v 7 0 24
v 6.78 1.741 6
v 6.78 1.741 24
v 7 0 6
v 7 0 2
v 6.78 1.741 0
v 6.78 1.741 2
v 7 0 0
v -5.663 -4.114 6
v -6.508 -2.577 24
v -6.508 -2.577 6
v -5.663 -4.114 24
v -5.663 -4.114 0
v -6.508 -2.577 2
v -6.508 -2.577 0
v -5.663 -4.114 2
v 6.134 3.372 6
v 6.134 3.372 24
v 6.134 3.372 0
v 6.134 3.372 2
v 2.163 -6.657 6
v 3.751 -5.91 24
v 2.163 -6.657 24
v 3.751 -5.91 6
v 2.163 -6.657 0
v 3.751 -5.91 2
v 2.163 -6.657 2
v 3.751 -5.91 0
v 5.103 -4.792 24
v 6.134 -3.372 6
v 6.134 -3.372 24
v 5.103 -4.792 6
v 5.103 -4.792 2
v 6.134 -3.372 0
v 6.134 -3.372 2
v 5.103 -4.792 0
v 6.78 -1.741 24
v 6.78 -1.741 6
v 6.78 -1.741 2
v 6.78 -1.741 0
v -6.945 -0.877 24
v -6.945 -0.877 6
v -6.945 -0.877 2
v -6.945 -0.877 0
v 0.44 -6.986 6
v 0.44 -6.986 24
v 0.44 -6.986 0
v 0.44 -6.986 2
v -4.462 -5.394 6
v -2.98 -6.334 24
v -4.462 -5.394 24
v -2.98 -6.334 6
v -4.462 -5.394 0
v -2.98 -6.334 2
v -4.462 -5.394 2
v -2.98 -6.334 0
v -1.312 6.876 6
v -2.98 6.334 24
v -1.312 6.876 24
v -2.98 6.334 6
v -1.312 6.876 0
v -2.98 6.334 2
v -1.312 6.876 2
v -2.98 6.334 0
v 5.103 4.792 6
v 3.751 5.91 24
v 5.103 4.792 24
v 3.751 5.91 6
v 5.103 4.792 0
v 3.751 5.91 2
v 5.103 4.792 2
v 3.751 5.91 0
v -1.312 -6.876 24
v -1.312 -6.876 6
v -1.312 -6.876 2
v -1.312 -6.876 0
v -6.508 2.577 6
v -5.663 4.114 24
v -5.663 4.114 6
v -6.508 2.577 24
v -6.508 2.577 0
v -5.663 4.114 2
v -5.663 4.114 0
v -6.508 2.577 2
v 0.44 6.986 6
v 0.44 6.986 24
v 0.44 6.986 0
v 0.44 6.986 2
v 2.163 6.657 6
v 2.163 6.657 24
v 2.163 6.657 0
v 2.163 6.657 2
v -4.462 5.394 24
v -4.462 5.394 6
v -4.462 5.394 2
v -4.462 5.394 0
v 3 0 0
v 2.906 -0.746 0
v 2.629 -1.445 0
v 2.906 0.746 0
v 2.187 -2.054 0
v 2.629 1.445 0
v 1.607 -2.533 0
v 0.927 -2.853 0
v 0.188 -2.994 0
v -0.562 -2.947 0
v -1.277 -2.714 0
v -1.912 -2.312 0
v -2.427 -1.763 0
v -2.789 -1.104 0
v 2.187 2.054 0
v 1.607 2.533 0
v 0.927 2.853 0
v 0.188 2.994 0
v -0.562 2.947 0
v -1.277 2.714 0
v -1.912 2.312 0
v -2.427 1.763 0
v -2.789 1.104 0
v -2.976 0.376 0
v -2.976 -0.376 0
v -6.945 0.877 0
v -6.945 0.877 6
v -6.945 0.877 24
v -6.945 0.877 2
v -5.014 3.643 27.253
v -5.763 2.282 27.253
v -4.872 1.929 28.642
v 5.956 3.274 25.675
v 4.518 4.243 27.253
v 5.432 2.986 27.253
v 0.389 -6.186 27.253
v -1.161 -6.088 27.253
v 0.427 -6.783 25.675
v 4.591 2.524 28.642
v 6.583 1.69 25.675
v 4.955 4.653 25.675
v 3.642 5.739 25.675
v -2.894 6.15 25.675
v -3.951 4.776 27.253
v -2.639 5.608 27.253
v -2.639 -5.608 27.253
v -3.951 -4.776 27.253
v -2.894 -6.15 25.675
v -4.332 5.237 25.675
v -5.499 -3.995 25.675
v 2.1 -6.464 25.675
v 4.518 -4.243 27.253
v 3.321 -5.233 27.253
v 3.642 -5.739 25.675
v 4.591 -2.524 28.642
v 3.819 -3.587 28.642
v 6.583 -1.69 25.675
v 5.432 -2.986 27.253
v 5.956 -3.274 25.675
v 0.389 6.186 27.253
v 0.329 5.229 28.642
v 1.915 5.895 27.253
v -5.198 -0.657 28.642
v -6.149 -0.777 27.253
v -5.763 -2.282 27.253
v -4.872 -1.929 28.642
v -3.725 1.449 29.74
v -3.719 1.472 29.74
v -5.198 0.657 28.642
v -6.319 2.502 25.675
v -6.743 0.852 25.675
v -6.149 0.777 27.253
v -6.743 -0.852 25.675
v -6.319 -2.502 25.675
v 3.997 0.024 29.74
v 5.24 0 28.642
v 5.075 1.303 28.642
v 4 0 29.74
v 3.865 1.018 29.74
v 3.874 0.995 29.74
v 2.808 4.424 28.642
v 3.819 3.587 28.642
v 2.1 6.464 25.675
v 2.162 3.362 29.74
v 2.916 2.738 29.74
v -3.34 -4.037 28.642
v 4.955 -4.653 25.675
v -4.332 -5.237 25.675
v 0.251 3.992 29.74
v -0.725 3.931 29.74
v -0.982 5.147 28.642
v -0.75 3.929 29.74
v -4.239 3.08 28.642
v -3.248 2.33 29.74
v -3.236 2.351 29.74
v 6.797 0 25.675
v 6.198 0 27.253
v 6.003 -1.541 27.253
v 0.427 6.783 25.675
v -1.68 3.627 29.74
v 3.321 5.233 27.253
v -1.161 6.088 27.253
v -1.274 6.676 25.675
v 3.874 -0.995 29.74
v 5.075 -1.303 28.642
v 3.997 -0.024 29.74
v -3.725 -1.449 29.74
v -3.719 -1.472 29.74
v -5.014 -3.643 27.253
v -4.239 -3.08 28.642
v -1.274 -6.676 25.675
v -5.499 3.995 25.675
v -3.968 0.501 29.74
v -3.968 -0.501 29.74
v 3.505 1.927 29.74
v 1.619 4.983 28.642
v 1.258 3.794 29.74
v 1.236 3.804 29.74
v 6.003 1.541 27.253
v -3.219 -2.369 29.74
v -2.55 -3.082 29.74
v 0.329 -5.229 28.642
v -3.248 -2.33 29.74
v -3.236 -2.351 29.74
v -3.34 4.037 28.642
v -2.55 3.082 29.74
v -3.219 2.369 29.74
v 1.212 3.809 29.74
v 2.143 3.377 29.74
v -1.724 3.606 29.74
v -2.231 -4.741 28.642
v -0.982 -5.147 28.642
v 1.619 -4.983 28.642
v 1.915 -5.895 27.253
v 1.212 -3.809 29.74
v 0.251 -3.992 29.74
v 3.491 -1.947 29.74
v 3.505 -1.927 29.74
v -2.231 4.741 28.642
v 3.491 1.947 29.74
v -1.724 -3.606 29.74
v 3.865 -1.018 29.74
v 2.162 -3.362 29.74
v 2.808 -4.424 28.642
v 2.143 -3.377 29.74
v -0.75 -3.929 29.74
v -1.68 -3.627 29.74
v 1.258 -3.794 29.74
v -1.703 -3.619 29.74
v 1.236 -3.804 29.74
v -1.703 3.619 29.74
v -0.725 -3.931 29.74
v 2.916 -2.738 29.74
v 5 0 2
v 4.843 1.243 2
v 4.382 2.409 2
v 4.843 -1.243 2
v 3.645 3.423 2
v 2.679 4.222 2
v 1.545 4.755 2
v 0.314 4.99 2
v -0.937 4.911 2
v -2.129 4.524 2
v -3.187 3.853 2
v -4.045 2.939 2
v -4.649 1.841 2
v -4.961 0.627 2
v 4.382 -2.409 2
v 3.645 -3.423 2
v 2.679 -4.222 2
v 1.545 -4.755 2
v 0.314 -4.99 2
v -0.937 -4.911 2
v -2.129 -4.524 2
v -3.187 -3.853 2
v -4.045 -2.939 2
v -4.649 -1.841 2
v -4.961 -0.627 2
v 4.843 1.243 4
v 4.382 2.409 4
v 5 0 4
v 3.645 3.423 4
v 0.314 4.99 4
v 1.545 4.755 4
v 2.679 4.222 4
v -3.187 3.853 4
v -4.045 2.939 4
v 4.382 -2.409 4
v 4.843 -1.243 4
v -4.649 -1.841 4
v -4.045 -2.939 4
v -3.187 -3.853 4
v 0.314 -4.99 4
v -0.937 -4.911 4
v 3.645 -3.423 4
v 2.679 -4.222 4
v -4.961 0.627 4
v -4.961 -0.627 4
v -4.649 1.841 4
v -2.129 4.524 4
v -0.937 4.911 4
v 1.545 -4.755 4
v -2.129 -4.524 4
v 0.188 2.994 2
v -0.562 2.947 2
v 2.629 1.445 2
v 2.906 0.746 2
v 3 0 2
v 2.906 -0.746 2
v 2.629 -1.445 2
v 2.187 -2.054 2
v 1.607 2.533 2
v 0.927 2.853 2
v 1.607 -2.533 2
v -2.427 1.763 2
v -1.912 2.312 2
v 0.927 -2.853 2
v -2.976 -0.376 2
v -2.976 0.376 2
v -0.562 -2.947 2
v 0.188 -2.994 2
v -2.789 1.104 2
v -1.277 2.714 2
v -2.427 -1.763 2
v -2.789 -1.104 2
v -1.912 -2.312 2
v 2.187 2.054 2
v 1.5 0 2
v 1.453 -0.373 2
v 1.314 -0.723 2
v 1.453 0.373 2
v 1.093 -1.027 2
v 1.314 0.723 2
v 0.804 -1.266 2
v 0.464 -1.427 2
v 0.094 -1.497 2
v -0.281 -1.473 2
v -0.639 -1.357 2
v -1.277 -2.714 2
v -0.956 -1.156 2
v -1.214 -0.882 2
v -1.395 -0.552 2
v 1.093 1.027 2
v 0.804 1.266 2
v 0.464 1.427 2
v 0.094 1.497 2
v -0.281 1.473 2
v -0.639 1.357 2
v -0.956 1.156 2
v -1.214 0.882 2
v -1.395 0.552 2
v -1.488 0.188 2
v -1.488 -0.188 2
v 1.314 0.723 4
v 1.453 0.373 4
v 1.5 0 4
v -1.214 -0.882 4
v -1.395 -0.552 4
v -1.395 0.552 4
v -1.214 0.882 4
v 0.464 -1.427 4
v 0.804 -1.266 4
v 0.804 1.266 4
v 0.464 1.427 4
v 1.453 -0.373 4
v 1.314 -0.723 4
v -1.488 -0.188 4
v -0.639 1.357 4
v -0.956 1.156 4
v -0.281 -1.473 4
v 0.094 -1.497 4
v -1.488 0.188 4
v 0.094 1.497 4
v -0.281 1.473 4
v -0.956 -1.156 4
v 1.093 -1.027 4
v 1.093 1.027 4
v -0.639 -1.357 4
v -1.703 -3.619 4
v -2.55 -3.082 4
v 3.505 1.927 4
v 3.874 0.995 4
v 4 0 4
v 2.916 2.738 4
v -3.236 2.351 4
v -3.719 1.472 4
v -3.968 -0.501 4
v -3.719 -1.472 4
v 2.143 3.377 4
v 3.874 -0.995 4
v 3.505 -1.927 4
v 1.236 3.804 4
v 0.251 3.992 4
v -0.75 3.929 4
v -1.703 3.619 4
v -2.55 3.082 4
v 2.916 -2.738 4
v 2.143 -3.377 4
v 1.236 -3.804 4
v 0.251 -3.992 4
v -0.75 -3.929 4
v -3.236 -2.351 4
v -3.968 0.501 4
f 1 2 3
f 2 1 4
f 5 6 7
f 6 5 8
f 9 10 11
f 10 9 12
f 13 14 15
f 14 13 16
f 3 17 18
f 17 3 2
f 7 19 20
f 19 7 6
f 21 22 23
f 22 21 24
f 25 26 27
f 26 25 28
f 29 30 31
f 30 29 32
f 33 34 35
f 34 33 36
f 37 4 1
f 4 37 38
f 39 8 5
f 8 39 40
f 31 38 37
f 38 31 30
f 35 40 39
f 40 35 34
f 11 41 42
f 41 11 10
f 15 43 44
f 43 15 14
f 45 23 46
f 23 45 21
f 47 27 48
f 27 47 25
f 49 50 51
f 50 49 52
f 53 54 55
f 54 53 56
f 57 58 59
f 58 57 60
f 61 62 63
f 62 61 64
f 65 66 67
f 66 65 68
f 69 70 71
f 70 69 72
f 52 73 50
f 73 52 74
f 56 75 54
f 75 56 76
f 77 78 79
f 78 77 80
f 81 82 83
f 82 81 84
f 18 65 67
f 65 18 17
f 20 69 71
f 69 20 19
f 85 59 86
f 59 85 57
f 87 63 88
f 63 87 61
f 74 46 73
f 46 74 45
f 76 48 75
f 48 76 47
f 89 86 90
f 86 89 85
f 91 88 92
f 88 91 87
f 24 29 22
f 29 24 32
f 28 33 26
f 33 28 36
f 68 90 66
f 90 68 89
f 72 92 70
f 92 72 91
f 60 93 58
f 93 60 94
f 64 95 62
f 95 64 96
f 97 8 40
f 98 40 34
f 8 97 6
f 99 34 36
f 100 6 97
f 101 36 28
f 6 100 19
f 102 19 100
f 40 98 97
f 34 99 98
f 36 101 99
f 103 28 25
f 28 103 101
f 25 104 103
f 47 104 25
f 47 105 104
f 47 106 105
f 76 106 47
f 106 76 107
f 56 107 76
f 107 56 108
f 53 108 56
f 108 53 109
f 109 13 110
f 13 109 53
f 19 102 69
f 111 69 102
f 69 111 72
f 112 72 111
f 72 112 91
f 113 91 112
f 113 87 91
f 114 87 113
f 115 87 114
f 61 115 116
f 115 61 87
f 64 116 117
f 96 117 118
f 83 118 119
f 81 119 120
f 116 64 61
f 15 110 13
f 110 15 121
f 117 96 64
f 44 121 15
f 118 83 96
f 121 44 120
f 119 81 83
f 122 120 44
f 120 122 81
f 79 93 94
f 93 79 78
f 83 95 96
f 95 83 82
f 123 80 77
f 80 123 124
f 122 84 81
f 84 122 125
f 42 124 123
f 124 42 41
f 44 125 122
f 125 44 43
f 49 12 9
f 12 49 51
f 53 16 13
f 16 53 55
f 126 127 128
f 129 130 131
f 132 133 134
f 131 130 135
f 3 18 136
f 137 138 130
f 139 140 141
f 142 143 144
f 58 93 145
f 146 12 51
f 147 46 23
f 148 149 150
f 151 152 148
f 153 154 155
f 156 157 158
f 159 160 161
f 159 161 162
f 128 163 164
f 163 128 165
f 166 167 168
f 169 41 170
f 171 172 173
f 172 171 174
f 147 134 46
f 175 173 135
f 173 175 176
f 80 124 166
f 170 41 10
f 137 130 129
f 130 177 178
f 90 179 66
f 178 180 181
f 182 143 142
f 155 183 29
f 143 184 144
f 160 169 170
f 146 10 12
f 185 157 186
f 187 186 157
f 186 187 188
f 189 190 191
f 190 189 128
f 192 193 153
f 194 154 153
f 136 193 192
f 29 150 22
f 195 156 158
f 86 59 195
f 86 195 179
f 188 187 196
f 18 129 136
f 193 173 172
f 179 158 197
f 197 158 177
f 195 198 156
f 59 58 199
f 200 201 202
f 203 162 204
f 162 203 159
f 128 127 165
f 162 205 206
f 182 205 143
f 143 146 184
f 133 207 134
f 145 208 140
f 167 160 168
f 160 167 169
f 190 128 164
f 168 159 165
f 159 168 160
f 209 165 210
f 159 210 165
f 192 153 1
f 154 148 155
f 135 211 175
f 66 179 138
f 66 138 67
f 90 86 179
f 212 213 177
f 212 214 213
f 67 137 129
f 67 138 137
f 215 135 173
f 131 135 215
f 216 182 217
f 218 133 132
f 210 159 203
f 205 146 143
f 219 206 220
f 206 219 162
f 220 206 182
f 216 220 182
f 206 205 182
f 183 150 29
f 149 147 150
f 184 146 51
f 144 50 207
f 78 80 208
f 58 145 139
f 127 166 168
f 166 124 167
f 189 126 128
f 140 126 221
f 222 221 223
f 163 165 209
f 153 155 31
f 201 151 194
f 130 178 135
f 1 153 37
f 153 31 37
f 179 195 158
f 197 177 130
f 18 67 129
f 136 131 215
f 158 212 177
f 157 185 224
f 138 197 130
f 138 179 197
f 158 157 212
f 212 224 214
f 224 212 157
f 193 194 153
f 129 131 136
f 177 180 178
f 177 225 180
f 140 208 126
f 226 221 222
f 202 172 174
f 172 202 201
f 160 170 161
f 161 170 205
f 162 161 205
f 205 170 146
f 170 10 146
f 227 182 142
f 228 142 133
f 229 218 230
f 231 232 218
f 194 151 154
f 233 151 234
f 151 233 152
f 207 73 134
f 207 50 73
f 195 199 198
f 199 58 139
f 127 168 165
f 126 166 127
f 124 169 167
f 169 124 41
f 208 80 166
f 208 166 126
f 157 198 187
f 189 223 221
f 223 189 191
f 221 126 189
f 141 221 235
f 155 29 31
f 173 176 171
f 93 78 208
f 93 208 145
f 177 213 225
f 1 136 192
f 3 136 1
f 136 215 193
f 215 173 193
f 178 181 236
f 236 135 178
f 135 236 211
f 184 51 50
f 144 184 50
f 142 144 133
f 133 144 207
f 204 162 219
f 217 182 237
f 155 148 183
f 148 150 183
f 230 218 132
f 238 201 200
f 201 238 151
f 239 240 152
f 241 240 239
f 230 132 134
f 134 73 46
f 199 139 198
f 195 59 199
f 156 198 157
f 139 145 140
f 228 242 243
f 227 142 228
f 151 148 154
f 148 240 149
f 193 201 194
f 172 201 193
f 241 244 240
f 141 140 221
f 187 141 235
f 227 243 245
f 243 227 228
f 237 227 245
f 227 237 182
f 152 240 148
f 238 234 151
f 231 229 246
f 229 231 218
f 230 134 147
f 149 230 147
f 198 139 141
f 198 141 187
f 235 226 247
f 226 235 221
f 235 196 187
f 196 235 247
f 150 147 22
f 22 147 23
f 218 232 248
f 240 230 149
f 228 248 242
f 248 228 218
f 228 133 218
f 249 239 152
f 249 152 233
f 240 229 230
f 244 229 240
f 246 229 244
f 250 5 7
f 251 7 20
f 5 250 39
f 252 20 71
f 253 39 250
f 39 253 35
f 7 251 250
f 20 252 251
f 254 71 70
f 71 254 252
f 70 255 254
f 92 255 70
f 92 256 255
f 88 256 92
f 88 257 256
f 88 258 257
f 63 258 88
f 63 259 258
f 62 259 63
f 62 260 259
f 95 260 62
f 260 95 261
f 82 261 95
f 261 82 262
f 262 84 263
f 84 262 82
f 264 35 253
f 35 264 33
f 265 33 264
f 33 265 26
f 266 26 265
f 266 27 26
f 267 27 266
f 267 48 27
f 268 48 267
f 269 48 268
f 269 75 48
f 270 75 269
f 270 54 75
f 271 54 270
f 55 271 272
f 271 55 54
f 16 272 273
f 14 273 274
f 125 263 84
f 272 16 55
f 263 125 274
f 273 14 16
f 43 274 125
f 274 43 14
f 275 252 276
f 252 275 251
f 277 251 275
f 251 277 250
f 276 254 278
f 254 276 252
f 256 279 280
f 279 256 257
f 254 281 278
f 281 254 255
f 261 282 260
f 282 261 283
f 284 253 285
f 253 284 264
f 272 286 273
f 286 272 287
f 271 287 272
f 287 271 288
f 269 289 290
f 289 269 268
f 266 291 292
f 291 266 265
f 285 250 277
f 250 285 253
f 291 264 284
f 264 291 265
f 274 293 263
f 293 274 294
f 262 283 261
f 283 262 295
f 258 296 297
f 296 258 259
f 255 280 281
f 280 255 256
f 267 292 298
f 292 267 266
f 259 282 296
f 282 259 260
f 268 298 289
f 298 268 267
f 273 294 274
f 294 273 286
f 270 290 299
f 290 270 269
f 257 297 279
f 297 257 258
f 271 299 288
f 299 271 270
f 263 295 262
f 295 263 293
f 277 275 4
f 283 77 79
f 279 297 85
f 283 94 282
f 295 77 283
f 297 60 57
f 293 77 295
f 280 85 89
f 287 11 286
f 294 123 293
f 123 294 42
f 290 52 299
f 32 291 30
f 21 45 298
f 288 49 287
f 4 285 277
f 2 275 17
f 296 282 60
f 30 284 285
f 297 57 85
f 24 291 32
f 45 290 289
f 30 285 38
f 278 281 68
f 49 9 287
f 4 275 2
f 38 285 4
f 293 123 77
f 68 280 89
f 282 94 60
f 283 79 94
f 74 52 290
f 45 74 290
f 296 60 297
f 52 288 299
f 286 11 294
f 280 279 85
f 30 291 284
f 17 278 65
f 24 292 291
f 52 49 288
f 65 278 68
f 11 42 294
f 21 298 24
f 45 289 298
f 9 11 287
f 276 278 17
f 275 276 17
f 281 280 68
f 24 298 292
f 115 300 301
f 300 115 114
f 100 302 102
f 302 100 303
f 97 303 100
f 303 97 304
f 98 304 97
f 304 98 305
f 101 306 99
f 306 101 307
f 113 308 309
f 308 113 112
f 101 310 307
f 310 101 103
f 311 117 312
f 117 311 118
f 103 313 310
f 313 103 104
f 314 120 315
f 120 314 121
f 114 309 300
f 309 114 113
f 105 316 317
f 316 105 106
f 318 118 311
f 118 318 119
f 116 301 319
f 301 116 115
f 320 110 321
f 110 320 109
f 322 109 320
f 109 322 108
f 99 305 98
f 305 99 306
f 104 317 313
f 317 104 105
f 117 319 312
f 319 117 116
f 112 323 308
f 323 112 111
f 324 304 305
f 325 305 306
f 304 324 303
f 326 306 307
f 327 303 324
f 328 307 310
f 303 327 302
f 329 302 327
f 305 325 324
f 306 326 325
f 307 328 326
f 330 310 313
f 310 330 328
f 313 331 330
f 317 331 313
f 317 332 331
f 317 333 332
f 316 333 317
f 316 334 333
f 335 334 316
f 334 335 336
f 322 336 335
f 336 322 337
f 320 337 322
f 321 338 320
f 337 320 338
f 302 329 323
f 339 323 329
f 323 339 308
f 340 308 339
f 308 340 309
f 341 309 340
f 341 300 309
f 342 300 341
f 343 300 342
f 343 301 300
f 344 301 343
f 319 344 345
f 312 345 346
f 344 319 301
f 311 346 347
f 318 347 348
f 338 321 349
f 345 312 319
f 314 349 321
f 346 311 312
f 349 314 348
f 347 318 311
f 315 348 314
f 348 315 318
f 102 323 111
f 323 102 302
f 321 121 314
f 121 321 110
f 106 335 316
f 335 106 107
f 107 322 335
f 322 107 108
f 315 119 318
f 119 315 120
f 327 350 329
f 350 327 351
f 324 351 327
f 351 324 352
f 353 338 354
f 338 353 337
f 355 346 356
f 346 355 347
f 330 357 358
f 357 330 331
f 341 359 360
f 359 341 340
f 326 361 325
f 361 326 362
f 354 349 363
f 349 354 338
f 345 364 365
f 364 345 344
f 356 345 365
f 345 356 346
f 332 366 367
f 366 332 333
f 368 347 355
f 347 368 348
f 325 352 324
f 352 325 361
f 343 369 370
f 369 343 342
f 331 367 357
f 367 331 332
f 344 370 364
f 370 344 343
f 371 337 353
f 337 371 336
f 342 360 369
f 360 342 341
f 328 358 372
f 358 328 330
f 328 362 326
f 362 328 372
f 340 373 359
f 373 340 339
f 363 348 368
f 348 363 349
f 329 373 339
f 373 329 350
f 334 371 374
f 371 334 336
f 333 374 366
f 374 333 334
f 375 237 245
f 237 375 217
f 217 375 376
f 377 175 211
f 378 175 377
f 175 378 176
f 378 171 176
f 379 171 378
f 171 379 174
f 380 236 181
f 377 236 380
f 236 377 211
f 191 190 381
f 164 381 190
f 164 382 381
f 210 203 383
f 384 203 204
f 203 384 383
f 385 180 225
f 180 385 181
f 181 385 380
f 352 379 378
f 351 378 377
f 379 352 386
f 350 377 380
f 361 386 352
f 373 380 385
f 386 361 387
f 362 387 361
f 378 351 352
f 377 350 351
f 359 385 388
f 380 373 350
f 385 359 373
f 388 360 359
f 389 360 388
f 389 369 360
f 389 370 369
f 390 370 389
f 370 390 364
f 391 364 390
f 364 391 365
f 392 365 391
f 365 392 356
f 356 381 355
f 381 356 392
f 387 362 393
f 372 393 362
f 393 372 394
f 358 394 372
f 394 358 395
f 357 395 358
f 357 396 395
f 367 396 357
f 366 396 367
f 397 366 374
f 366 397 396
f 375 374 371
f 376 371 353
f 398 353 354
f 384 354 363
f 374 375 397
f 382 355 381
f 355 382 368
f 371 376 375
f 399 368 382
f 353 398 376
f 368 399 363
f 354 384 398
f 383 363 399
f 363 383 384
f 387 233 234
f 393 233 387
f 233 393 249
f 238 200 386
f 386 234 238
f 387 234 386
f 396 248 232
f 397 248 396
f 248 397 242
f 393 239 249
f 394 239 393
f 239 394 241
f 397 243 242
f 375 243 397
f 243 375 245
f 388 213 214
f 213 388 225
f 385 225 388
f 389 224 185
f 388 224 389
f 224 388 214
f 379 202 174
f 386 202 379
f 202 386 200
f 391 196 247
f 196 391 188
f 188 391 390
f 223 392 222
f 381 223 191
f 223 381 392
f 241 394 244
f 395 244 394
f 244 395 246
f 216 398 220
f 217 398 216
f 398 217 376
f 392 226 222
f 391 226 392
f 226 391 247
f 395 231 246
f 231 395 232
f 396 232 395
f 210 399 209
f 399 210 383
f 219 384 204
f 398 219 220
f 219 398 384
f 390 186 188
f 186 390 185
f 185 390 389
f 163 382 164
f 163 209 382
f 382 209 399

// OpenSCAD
$fn=25;   // For persion of polygons

height = 24;
radius = 7;
gap = 2;

cap = 3;
fuse= 1.5;
pipe= 4;

difference(){
union(){
difference(){
union(){   // this is my base shape
cylinder(r=radius,h=height);
translate([0,0,height]){
sphere(radius);}
}

translate([0,0,gap]){ // this is ring
difference(){
cylinder(r=(radius+gap),h=(gap*gap));
cylinder(r=(radius-gap),h=(gap*gap));
}}
}

translate([0,0,(gap*gap)]){ // this is the slope
    cylinder(gap,r=radius,(radius-gap));
}
}

translate([0,0,-1]){ // cap grove
    cylinder(cap,r=cap);
}
translate([0,0,-1]){ // fuse grove
    cylinder((height*height),r=fuse);
}
translate([0,0,(gap*gap)]){ // pipe grove
    cylinder((height*height),r=pipe);
}
}
